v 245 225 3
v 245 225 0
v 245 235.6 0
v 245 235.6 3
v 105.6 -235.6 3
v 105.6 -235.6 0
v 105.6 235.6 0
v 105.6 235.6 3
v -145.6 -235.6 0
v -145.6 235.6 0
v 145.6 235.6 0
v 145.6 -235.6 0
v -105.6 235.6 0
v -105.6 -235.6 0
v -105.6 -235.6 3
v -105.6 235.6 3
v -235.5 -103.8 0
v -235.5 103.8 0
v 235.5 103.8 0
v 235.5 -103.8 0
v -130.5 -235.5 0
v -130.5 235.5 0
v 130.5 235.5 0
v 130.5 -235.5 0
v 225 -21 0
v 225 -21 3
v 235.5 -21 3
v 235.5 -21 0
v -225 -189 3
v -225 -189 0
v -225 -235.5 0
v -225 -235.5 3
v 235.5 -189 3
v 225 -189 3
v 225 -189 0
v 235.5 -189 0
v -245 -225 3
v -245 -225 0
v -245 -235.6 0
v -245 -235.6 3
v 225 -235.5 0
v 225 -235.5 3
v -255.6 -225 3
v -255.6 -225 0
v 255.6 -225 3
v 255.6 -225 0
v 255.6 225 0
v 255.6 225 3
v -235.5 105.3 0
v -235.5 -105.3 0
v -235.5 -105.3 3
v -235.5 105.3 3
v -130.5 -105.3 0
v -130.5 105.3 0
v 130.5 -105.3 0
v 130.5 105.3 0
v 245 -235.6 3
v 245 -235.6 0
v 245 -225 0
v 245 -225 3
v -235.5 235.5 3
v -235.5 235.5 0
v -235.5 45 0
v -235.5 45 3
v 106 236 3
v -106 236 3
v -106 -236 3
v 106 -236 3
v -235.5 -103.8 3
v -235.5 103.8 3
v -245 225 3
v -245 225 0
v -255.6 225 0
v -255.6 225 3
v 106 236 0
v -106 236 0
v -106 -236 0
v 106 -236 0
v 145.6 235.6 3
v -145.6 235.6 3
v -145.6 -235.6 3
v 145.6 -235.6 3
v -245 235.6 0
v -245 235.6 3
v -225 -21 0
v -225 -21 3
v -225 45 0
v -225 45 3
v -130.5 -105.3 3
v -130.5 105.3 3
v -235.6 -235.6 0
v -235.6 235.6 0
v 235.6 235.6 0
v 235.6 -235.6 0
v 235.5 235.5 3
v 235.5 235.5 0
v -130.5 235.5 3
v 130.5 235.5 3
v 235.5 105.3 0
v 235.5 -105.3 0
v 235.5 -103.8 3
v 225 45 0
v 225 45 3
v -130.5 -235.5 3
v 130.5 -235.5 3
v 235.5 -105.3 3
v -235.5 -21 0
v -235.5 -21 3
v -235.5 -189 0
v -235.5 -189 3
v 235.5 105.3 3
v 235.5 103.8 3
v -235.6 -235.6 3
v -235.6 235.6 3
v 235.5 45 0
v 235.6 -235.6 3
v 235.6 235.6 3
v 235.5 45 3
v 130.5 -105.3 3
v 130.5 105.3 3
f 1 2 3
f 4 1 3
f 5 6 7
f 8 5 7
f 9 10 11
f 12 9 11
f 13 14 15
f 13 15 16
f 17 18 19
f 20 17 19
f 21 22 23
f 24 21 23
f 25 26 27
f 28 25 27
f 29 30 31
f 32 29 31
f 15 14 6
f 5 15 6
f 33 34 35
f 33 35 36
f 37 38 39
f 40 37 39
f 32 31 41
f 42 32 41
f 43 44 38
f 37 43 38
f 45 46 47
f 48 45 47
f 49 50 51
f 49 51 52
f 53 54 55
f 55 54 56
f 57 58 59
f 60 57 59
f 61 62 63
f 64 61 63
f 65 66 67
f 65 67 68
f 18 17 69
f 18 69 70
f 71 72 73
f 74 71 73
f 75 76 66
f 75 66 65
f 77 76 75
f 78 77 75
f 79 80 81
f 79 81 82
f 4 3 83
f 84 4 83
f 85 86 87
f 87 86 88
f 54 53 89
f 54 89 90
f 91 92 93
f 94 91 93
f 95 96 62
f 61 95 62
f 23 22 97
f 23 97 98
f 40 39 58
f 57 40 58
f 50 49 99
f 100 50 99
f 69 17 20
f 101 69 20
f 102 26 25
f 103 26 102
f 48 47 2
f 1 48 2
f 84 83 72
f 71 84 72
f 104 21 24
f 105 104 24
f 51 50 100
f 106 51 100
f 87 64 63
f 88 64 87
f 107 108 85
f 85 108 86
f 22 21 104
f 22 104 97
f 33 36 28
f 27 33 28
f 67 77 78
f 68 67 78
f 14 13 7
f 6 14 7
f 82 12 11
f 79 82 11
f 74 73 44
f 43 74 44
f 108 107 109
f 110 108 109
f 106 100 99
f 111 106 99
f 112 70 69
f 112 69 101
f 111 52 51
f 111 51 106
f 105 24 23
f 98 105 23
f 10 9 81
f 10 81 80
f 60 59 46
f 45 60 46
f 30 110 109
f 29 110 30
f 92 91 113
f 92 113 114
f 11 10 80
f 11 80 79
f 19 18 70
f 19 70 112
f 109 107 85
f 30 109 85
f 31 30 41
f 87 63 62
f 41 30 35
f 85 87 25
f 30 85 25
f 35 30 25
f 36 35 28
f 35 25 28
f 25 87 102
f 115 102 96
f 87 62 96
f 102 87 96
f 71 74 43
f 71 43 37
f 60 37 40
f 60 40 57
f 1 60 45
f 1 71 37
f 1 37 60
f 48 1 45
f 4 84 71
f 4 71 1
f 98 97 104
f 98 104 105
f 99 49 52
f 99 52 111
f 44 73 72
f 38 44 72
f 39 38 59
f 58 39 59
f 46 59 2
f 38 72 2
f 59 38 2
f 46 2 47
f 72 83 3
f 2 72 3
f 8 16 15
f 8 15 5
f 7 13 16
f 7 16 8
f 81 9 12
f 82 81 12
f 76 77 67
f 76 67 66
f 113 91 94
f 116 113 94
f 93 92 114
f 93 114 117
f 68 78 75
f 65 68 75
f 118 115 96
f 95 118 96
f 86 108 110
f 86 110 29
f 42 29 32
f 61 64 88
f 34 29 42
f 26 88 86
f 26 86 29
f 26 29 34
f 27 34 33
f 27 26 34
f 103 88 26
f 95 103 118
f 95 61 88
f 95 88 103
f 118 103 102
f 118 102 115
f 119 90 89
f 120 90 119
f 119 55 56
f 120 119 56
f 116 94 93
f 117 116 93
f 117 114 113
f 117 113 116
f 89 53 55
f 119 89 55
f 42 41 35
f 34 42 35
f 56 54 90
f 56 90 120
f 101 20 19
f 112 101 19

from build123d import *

# Parameters (mm, degrees)
SKETCH_W     = 212
SKETCH_H     = 472
PAD_DEPTH    = 3
SKETCH002_W  = 471.2
SKETCH002_H  = 471.2
PAD002_DEPTH = 3
SKETCH004_W  = 291.2
SKETCH004_H  = 471.2
PAD004_DEPTH = 3
PAD001_DEPTH = 3
SKETCH003_W  = 211.2
SKETCH003_H  = 471.2
PAD003_DEPTH = 3
PAD005_DEPTH = 3
SKETCH006_W  = 30
SKETCH006_H  = 66
POCKET_DEPTH = 5
SKETCH007_W  = 261
SKETCH007_H  = 210.6
PAD006_DEPTH = 3
SKETCH008_W  = 471
SKETCH008_H  = 207.6
PAD007_DEPTH = 3
SKETCH009_W  = 471
SKETCH009_H  = 210.6
PAD008_DEPTH = 3
SKETCH010_W  = 261
SKETCH010_H  = 471
PAD009_DEPTH = 3


with BuildPart() as plexi_472x212_body:
    # Sketch → Pad (new body)
    with BuildSketch(Plane.XY):
        Rectangle(SKETCH_W, SKETCH_H)
    extrude(amount=PAD_DEPTH)


with BuildPart() as plexi_front_471_2x471_2_body:
    # Sketch002 → Pad002 (new body)
    with BuildSketch(Plane.XY):
        Rectangle(SKETCH002_W, SKETCH002_H)
    extrude(amount=PAD002_DEPTH)


with BuildPart() as plexi_top_471_2x291_2_body:
    # Sketch004 → Pad004 (new body)
    with BuildSketch(Plane.XY):
        Rectangle(SKETCH004_W, SKETCH004_H)
    extrude(amount=PAD004_DEPTH)


with BuildPart() as plexi_bottom_511_2x471_2_body:
    # Sketch001 → Pad001 (new body)
    with BuildSketch(Plane.XY):
        Polygon((-245, 225), (-255.6, 225), (-255.6, -225), (-245, -225), (-245, -235.6), (245, -235.6), (245, -225), (255.6, -225), (255.6, 225), (245, 225), (245, 235.6), (-245, 235.6), align=None)
    extrude(amount=PAD001_DEPTH)


with BuildPart() as plexi_top_471_2x211_2_body:
    # Sketch003 → Pad003 (new body)
    with BuildSketch(Plane.XY):
        Rectangle(SKETCH003_W, SKETCH003_H)
    extrude(amount=PAD003_DEPTH)


with BuildPart() as plexi_back_471x471_body:
    # Sketch005 → Pad005 (new body)
    with BuildSketch(Plane.XY):
        Polygon((225, -225), (235.5, -225), (235.5, 235.5), (-235.5, 235.5), (-235.5, -225), (-225, -225), (-225, -235.5), (225, -235.5), align=None)
    extrude(amount=PAD005_DEPTH)

    # Sketch006 (on Face10 of Pad005) → Pocket (cut)
    with BuildSketch(Plane.XY.offset(3)):
        with Locations((240, 12)):
            Rectangle(SKETCH006_W, SKETCH006_H)
        with Locations((-240, 12)):
            Rectangle(SKETCH006_W, SKETCH006_H)
        with Locations((-240, -222)):
            Rectangle(SKETCH006_W, SKETCH006_H)
        with Locations((240, -222)):
            Rectangle(SKETCH006_W, SKETCH006_H)
    extrude(amount=-POCKET_DEPTH, mode=Mode.SUBTRACT)


with BuildPart() as plexi_electronics_side_261x210_6_body:
    # Sketch007 → Pad006 (new body)
    with BuildSketch(Plane.XY):
        Rectangle(SKETCH007_W, SKETCH007_H)
    extrude(amount=PAD006_DEPTH)


with BuildPart() as plexi_electronics_top_471x207_6_body:
    # Sketch008 → Pad007 (new body)
    with BuildSketch(Plane.XY):
        Rectangle(SKETCH008_W, SKETCH008_H)
    extrude(amount=PAD007_DEPTH)


with BuildPart() as plexi_electronics_bottom_471x210_6_body:
    # Sketch009 → Pad008 (new body)
    with BuildSketch(Plane.XY):
        Rectangle(SKETCH009_W, SKETCH009_H)
    extrude(amount=PAD008_DEPTH)


with BuildPart() as plexi_electronics_front_471x261_body:
    # Sketch010 → Pad009 (new body)
    with BuildSketch(Plane.XY):
        Rectangle(SKETCH010_W, SKETCH010_H)
    extrude(amount=PAD009_DEPTH)


solid = Compound([plexi_472x212_body.part, plexi_front_471_2x471_2_body.part, plexi_top_471_2x291_2_body.part, plexi_bottom_511_2x471_2_body.part, plexi_top_471_2x211_2_body.part, plexi_back_471x471_body.part, plexi_electronics_side_261x210_6_body.part, plexi_electronics_top_471x207_6_body.part, plexi_electronics_bottom_471x210_6_body.part, plexi_electronics_front_471x261_body.part])
